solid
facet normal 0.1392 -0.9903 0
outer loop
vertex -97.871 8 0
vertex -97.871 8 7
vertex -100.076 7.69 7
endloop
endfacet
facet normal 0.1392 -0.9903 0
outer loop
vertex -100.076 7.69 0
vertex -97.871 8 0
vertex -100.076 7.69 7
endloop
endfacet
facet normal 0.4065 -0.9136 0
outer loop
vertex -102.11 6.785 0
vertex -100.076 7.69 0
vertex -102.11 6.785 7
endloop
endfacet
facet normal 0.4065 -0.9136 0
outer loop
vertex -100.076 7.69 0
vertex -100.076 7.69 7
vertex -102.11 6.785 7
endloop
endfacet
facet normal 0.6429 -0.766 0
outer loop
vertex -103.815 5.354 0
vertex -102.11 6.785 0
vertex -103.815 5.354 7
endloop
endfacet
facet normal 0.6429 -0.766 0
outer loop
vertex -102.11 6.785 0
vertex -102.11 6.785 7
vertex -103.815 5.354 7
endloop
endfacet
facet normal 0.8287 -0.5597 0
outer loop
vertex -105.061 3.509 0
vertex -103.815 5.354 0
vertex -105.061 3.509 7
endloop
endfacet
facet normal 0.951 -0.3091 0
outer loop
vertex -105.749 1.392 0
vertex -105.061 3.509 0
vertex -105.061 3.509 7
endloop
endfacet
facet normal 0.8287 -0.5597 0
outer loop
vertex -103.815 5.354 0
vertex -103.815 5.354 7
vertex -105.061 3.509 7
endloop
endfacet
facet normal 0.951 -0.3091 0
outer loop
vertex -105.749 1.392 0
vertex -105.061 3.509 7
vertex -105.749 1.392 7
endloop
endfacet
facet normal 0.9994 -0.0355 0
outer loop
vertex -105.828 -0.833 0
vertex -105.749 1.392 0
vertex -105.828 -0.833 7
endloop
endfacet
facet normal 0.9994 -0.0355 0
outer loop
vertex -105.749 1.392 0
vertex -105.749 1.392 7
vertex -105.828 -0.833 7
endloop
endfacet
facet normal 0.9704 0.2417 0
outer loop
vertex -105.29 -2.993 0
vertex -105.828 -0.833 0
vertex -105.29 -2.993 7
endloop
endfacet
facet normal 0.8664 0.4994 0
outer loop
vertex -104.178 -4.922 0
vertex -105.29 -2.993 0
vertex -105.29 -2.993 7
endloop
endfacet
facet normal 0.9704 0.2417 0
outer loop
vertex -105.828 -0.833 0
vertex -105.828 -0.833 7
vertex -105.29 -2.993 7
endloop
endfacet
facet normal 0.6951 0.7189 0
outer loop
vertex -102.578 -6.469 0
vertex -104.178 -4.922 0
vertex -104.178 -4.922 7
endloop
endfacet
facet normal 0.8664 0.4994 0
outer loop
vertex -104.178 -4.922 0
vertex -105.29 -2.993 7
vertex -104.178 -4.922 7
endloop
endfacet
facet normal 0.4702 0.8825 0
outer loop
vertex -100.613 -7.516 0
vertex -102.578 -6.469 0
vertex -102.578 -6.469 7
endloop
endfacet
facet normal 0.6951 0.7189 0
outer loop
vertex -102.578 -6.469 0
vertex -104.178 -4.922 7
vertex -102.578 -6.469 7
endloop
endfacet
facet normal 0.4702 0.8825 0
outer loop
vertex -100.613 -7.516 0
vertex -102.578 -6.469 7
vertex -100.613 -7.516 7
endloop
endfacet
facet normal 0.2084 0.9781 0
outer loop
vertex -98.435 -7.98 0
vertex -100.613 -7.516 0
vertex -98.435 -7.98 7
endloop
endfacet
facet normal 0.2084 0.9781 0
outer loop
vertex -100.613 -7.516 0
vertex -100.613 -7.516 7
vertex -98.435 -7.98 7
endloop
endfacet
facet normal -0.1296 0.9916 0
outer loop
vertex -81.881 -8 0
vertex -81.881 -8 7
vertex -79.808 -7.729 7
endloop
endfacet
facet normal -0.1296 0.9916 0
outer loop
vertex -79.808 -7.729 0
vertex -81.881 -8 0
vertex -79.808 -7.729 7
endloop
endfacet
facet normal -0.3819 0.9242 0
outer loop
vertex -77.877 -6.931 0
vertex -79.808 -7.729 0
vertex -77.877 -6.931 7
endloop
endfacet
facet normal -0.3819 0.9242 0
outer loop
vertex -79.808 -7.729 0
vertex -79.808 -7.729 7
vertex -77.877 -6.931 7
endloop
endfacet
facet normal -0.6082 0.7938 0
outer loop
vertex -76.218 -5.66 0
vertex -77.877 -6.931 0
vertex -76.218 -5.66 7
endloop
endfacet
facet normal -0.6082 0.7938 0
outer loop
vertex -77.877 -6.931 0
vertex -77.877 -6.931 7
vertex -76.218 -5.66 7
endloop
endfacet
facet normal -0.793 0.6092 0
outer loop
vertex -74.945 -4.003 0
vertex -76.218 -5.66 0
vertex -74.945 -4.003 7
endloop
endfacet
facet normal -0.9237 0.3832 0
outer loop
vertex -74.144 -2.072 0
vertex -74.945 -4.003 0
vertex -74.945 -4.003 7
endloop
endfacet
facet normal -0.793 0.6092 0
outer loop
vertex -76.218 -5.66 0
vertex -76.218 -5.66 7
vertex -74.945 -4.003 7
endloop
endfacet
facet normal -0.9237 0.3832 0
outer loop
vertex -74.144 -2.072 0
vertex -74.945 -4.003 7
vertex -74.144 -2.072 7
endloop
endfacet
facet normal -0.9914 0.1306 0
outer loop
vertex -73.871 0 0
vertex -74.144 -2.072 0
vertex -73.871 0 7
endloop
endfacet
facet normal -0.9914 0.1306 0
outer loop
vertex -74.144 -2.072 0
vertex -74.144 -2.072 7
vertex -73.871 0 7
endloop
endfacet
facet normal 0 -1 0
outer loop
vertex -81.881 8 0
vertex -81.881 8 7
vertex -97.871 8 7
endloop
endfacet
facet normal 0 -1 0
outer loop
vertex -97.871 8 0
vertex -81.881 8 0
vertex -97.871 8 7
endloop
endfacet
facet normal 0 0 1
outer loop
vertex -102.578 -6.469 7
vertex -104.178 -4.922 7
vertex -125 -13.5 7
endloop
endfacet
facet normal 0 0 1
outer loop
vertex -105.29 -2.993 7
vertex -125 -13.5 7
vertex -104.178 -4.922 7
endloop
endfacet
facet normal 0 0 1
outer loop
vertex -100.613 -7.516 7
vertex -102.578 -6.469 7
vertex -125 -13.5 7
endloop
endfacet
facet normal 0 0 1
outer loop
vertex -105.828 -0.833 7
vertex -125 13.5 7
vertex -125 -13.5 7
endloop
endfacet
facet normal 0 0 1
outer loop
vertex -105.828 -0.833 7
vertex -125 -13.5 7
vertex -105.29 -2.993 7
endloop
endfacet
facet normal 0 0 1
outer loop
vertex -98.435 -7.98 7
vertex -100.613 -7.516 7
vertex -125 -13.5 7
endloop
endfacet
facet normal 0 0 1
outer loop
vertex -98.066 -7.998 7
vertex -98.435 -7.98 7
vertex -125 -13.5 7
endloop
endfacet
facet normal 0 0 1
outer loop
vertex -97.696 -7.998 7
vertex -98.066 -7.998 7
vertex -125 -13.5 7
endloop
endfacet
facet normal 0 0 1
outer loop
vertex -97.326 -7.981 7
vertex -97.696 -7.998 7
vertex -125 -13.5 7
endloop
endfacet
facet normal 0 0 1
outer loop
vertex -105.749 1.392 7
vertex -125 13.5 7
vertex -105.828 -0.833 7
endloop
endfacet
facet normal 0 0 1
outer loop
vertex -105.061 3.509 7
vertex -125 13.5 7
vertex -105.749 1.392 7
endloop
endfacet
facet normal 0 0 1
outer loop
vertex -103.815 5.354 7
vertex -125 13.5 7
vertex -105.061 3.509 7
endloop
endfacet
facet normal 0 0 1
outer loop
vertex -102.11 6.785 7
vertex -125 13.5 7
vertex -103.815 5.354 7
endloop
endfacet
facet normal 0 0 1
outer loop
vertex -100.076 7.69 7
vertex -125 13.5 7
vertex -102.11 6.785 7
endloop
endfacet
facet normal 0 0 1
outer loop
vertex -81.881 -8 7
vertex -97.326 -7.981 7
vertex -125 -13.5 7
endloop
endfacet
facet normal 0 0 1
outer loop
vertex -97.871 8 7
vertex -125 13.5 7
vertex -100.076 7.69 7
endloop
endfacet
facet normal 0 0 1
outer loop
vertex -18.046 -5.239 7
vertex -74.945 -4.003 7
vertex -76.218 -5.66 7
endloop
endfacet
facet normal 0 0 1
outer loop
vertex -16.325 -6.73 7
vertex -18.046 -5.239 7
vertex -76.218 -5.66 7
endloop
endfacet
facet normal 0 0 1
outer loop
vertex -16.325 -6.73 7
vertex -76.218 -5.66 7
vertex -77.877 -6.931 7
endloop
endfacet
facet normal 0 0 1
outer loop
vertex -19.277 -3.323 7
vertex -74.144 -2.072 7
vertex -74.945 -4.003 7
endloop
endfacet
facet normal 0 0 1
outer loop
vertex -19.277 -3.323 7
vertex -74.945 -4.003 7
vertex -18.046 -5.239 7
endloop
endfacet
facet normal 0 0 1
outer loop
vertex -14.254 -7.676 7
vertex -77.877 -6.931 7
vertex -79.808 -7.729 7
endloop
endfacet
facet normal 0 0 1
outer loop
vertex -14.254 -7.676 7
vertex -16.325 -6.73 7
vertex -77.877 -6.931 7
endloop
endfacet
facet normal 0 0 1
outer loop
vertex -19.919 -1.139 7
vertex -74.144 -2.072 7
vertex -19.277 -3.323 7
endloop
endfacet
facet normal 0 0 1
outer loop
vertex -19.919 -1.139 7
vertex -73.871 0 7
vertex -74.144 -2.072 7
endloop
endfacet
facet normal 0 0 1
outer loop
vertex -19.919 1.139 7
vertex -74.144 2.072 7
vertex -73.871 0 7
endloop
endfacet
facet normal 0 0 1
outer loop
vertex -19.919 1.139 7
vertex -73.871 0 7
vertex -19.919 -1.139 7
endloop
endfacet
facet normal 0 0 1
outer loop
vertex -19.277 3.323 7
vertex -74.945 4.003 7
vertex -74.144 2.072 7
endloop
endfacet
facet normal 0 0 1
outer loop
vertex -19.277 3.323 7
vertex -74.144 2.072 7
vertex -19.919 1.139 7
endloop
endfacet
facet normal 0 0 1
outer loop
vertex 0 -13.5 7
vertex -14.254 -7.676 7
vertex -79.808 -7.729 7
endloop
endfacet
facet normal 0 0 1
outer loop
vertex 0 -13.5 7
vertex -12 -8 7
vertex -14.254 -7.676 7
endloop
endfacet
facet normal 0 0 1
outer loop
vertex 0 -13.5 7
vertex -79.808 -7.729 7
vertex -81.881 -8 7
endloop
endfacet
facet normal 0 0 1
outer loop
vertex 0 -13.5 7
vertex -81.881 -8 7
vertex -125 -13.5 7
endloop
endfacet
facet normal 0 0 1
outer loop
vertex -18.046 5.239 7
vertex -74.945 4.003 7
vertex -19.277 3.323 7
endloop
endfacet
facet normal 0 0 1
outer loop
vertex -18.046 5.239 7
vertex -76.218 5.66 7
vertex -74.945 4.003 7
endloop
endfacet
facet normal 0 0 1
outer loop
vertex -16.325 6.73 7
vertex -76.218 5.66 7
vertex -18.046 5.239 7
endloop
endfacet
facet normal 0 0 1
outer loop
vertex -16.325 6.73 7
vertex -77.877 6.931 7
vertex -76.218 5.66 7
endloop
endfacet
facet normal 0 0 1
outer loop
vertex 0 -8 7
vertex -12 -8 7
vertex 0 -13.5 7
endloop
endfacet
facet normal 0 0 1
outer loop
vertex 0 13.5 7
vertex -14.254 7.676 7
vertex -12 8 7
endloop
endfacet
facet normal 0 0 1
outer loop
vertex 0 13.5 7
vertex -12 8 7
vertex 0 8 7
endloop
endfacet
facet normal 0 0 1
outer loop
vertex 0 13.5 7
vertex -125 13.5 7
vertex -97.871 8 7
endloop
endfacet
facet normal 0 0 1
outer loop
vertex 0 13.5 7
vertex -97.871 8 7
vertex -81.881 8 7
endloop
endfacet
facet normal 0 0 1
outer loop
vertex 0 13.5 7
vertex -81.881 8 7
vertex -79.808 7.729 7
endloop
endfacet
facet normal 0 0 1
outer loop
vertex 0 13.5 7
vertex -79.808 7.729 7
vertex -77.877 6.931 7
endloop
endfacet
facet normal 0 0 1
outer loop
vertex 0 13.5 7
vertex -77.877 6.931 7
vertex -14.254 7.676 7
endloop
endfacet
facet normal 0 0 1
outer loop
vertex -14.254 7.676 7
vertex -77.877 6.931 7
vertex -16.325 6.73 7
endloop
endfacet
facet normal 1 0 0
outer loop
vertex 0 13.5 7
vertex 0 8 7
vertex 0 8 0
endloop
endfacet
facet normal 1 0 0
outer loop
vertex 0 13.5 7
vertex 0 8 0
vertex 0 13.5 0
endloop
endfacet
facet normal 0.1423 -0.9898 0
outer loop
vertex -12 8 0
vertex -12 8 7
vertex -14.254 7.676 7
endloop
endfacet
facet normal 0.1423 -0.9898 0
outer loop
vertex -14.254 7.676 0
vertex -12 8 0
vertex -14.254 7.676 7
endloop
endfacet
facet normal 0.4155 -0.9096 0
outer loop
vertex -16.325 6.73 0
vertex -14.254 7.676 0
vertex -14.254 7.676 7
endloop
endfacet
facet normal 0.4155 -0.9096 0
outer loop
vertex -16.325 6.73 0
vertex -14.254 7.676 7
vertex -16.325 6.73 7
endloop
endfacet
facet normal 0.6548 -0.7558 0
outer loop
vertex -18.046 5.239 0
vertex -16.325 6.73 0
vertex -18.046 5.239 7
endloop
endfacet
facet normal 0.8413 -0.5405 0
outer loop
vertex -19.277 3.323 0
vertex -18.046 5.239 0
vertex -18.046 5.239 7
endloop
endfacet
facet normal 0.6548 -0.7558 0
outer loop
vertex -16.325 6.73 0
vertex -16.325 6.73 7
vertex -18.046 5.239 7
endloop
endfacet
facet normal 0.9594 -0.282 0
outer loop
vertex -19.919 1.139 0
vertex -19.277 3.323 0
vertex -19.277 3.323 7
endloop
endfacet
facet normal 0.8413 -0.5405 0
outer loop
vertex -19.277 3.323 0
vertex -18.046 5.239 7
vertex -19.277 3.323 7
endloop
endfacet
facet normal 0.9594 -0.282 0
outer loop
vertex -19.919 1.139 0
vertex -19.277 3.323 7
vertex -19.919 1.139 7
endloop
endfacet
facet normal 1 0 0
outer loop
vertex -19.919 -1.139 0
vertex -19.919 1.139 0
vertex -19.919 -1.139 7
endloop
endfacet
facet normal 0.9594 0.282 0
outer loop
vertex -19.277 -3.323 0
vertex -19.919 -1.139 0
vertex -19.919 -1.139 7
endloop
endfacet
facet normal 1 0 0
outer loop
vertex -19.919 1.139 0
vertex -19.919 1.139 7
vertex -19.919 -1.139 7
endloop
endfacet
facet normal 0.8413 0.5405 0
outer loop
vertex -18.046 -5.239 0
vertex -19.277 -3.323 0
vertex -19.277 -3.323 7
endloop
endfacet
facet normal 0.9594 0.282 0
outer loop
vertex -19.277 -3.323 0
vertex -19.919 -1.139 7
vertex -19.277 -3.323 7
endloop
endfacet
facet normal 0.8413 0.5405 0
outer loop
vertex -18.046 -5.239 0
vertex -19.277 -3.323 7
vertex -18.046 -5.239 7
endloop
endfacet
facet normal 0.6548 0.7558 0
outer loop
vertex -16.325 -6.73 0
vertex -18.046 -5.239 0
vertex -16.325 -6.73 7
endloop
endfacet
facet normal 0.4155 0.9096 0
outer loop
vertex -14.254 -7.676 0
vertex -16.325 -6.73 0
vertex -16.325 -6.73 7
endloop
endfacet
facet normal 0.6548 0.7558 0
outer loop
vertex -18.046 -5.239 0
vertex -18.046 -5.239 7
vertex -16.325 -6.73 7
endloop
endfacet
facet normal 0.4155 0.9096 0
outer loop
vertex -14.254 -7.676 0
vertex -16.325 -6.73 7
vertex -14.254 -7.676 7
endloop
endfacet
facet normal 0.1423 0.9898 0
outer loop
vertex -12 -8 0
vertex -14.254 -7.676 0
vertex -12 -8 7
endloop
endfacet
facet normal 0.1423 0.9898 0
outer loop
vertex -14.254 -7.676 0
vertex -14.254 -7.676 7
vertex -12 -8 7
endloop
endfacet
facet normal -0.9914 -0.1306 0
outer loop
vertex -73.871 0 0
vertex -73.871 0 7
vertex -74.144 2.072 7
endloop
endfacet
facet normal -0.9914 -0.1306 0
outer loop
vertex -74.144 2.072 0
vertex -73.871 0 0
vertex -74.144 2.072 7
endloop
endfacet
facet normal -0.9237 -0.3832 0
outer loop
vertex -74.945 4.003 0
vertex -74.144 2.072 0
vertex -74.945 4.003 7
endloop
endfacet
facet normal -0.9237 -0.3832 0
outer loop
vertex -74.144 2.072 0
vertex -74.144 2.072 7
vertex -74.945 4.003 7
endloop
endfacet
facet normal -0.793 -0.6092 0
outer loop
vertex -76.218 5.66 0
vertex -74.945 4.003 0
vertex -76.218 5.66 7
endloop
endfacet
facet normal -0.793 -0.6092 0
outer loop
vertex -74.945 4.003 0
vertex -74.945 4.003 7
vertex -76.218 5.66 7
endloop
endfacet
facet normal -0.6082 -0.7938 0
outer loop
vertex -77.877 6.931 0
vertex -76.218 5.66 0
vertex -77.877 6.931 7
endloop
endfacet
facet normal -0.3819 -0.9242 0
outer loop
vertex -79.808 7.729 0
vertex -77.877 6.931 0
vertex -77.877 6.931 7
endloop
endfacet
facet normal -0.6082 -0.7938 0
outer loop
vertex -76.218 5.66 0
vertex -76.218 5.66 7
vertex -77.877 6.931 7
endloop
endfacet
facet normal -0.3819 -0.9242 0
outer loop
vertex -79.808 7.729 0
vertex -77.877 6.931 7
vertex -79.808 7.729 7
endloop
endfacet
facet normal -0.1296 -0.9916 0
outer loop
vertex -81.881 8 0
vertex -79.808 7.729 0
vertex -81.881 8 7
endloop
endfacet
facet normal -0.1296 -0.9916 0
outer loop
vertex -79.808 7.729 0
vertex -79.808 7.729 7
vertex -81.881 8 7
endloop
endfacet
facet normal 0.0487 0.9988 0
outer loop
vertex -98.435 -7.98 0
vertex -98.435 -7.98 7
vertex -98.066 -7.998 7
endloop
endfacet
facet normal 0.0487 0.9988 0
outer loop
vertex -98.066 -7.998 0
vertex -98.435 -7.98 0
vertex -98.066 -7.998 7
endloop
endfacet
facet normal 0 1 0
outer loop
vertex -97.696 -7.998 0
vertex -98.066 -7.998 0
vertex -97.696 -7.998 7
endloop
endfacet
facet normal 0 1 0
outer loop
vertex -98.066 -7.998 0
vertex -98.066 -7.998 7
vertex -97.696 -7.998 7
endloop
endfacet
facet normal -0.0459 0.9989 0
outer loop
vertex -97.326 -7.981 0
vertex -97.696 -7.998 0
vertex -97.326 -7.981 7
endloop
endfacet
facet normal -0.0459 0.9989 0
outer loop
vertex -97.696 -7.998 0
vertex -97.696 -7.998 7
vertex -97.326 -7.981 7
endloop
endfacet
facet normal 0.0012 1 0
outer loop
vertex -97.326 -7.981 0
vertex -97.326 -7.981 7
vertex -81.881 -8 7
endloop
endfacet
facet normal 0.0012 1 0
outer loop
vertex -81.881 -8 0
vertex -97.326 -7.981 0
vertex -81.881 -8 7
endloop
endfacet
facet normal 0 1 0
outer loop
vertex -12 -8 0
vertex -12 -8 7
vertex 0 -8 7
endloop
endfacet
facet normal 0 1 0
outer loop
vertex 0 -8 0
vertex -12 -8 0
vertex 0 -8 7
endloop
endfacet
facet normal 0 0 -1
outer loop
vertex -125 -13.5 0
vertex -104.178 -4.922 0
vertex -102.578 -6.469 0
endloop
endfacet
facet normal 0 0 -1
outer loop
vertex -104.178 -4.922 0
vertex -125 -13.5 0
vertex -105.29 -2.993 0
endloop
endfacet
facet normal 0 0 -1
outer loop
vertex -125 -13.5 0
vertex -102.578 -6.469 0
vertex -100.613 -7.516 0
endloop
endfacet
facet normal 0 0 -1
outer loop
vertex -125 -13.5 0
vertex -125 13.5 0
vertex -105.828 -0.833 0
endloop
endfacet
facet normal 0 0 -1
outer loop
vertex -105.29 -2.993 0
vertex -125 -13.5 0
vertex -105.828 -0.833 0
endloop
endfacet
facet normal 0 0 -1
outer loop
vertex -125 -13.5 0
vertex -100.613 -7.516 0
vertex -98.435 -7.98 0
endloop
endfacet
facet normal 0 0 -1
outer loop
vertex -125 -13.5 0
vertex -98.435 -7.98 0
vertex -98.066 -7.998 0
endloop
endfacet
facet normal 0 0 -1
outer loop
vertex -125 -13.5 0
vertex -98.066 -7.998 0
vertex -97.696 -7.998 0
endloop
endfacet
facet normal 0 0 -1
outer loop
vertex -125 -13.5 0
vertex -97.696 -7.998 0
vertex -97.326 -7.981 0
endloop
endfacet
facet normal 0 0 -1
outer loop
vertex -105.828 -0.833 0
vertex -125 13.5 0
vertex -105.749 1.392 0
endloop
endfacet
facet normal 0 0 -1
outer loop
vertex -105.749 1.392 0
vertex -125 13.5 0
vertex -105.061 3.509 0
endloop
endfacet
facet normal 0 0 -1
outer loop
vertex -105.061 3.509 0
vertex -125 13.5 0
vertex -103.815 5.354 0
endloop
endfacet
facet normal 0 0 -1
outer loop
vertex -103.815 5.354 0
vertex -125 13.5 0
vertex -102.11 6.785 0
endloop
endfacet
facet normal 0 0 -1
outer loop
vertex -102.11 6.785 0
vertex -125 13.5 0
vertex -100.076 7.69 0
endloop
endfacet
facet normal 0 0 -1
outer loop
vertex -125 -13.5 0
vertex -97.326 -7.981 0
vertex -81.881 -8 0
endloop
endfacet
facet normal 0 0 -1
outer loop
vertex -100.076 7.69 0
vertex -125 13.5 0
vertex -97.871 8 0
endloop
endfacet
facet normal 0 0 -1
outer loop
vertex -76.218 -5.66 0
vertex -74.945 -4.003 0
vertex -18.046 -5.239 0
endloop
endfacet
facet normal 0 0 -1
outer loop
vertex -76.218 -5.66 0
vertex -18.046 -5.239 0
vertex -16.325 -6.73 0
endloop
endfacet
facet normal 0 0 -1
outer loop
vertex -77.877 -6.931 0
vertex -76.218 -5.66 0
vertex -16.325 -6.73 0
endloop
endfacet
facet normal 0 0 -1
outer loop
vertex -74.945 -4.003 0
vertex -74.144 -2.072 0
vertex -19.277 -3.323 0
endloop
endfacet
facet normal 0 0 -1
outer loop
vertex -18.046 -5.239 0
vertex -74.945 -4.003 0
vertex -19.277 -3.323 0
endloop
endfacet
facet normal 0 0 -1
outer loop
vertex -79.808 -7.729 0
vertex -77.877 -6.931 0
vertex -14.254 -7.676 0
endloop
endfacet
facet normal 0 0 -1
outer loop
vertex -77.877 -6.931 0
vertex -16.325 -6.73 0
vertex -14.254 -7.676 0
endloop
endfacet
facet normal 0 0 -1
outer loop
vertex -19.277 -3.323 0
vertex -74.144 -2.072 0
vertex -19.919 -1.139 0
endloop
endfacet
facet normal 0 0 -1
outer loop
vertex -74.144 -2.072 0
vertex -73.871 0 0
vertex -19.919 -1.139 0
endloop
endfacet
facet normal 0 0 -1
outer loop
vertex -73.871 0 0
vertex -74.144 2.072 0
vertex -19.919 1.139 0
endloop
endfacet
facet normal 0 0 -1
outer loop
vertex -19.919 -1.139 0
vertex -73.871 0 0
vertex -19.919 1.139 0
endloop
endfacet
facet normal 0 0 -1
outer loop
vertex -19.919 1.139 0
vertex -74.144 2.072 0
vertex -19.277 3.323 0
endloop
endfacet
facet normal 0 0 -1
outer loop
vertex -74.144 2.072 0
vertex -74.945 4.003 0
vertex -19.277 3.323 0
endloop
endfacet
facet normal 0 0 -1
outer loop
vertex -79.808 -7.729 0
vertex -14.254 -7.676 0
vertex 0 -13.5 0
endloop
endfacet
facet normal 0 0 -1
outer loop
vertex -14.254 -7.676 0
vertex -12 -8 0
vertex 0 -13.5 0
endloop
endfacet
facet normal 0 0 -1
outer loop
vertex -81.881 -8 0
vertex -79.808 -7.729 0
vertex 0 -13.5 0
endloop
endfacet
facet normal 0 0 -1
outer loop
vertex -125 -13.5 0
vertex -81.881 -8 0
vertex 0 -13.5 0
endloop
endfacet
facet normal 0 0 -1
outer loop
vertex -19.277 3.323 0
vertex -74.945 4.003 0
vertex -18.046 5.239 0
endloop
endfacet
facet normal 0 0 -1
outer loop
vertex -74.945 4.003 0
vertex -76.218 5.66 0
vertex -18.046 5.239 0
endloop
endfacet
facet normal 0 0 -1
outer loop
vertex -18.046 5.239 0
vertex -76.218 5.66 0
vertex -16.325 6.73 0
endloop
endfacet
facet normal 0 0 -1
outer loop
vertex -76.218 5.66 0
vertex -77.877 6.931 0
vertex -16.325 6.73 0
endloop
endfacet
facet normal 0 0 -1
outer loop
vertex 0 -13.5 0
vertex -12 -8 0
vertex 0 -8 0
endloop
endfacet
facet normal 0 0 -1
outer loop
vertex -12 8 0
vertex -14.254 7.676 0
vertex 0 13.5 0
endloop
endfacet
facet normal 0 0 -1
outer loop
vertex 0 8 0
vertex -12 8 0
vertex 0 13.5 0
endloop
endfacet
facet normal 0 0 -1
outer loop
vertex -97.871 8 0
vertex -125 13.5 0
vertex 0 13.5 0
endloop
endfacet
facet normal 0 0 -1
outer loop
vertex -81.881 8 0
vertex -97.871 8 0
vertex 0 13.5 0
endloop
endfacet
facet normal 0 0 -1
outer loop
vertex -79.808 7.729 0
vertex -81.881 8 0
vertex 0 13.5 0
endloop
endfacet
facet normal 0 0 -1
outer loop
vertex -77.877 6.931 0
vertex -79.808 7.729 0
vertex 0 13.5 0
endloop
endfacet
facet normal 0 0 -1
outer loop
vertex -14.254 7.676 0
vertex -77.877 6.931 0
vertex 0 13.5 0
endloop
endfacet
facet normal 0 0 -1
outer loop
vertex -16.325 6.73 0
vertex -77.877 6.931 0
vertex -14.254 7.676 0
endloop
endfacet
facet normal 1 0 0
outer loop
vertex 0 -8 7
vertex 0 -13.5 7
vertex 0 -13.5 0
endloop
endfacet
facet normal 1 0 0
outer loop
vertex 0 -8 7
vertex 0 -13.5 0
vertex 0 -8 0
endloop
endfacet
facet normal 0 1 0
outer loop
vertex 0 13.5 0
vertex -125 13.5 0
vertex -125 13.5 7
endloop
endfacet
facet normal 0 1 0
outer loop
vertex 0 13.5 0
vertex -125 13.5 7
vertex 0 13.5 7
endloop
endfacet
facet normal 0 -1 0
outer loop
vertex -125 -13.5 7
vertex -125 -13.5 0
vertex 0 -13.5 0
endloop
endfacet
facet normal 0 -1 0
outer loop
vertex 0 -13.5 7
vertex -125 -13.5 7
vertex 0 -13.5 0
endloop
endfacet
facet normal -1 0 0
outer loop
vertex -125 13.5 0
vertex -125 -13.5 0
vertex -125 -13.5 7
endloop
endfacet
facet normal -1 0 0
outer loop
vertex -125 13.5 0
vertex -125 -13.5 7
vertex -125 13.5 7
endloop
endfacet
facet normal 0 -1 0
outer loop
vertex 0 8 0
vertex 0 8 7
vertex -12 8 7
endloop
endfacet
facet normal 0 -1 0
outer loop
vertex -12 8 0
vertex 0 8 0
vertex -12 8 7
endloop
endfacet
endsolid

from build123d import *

# Parameters (mm, degrees)
F0_W     = 250
F0_H     = 27
F1_DEPTH = 7
F3_DEPTH = 25
F4_W     = 125
F4_H     = 94.8358140886
F5_DEPTH = 25


# Not quite as in the source:
# - ends of sketch curves that miss each other by under 0.0002 mm in the source are joined


with BuildPart() as f1:
    # F0 (on Top) → F1 (new body)
    with BuildSketch(Plane.XY):
        Rectangle(F0_W, F0_H)
    extrude(amount=F1_DEPTH)

    # F2 (on face) → F3 (cut)
    with BuildSketch(Plane.XY.offset(7)):
        with BuildLine():
            ThreePointArc((87, -8), (92.6568542495, -5.6568542495), (95, 0))
            ThreePointArc((95, 0), (92.6568542495, 5.6568542495), (87, 8))
            ThreePointArc((87, 8), (81.3431457505, 5.6568542495), (79, 0))
            ThreePointArc((79, 0), (81.3431457505, -5.6568542495), (87, -8))
        make_face()
        with BuildLine():
            ThreePointArc((79, 0), (81.3431457505, 5.6568542495), (87, 8))
            Line((87, 8), (71, 7.999994214))
            ThreePointArc((71, 7.999994214), (76.6568542495, 5.6568542495), (79, 0))
        make_face()
        with BuildLine():
            Line((71, -7.999994214), (87, -8))
            ThreePointArc((87, -8), (81.3431457505, -5.6568542495), (79, 0))
            ThreePointArc((79, 0), (76.6568542495, -5.6568542495), (71, -7.999994214))
        make_face()
        with BuildLine():
            ThreePointArc((71, -8), (76.6568542495, -5.6568542495), (79, 0))
            ThreePointArc((79, 0), (76.6568542495, 5.6568542495), (71, 8))
            ThreePointArc((71, 8), (63, 0), (71, -8))
        make_face()
        with BuildLine():
            ThreePointArc((-12, -8), (-6.3431457505, -5.6568542495), (-4, 0))
            ThreePointArc((-4, 0), (-6.3431457505, 5.6568542495), (-12, 8))
            ThreePointArc((-12, 8), (-20, 0), (-12, -8))
        make_face()
        with BuildLine():
            ThreePointArc((4, -8), (-1.6568542495, -5.6568542495), (-4, 0))
            ThreePointArc((-4, 0), (-6.3431457505, -5.6568542495), (-12, -8))
            Line((-12, -8), (4, -8))
        make_face()
        with BuildLine():
            ThreePointArc((-12, 8), (-6.3431457505, 5.6568542495), (-4, 0))
            ThreePointArc((-4, 0), (-1.6568542495, 5.6568542495), (4, 8))
            Line((4, 8), (-12, 8))
        make_face()
        with BuildLine():
            ThreePointArc((4, 8), (-1.6568542495, 5.6568542495), (-4, 0))
            ThreePointArc((-4, 0), (-1.6568542495, -5.6568542495), (4, -8))
            ThreePointArc((4, -8), (9.6568542495, -5.6568542495), (12, 0))
            ThreePointArc((12, 0), (9.6568542495, 5.6568542495), (4, 8))
        make_face()
        with BuildLine():
            ThreePointArc((-81.8808954364, -7.999994214), (-76.2178223077, -5.660255005), (-73.871273756, 0))
            ThreePointArc((-73.871273756, 0), (-76.2178223077, 5.660255005), (-81.8808954364, 7.999994214))
            Line((-81.8808954364, 7.999994214), (-81.8808954364, -7.999994214))
        make_face()
        with BuildLine():
            Line((-81.8808954364, -7.999994214), (-81.8808954364, 7.999994214))
            ThreePointArc((-81.8808954364, 7.999994214), (-87.531528761, 5.6534514483), (-89.871273756, 0))
            ThreePointArc((-89.871273756, 0), (-87.531528761, -5.6534514483), (-81.8808954364, -7.999994214))
        make_face()
        with BuildLine():
            ThreePointArc((-89.871273756, 0), (-87.531528761, 5.6534514483), (-81.8808954364, 7.999994214))
            Line((-81.8808954364, 7.999994214), (-97.871273756, 8))
            ThreePointArc((-97.871273756, 8), (-92.2144195065, 5.6568542495), (-89.871273756, 0))
        make_face()
        with BuildLine():
            Line((-97.32632471, -7.9814178275), (-81.8808954364, -7.999994214))
            ThreePointArc((-81.8808954364, -7.999994214), (-87.531528761, -5.6534514483), (-89.871273756, 0))
            ThreePointArc((-89.871273756, 0), (-92.0249247941, -5.4607878384), (-97.32632471, -7.9814178275))
        make_face()
        with BuildLine():
            ThreePointArc((-97.32632471, -7.9814178275), (-92.0249247941, -5.4607878384), (-89.871273756, 0))
            ThreePointArc((-89.871273756, 0), (-92.2144195065, 5.6568542495), (-97.871273756, 8))
            ThreePointArc((-97.871273756, 8), (-105.8662931823, 0.2822487793), (-98.4354198745, -7.9800839066))
            Line((-98.4354198745, -7.9800839066), (-97.32632471, -7.9814178275))
        make_face()
        with BuildLine():
            ThreePointArc((-98.4354198745, -7.9800839066), (-97.8808954364, -7.999994214), (-97.32632471, -7.9814178275))
            Line((-97.32632471, -7.9814178275), (-98.4354198745, -7.9800839066))
        make_face()
    extrude(amount=-F3_DEPTH, mode=Mode.SUBTRACT)

    # F4 (on face) → F5 (cut)
    with BuildSketch(Plane.XY.offset(7)):
        with Locations((62.5, -3.4542847425)):
            Rectangle(F4_W, F4_H)
    extrude(amount=-F5_DEPTH, mode=Mode.SUBTRACT)


solid = f1.part
